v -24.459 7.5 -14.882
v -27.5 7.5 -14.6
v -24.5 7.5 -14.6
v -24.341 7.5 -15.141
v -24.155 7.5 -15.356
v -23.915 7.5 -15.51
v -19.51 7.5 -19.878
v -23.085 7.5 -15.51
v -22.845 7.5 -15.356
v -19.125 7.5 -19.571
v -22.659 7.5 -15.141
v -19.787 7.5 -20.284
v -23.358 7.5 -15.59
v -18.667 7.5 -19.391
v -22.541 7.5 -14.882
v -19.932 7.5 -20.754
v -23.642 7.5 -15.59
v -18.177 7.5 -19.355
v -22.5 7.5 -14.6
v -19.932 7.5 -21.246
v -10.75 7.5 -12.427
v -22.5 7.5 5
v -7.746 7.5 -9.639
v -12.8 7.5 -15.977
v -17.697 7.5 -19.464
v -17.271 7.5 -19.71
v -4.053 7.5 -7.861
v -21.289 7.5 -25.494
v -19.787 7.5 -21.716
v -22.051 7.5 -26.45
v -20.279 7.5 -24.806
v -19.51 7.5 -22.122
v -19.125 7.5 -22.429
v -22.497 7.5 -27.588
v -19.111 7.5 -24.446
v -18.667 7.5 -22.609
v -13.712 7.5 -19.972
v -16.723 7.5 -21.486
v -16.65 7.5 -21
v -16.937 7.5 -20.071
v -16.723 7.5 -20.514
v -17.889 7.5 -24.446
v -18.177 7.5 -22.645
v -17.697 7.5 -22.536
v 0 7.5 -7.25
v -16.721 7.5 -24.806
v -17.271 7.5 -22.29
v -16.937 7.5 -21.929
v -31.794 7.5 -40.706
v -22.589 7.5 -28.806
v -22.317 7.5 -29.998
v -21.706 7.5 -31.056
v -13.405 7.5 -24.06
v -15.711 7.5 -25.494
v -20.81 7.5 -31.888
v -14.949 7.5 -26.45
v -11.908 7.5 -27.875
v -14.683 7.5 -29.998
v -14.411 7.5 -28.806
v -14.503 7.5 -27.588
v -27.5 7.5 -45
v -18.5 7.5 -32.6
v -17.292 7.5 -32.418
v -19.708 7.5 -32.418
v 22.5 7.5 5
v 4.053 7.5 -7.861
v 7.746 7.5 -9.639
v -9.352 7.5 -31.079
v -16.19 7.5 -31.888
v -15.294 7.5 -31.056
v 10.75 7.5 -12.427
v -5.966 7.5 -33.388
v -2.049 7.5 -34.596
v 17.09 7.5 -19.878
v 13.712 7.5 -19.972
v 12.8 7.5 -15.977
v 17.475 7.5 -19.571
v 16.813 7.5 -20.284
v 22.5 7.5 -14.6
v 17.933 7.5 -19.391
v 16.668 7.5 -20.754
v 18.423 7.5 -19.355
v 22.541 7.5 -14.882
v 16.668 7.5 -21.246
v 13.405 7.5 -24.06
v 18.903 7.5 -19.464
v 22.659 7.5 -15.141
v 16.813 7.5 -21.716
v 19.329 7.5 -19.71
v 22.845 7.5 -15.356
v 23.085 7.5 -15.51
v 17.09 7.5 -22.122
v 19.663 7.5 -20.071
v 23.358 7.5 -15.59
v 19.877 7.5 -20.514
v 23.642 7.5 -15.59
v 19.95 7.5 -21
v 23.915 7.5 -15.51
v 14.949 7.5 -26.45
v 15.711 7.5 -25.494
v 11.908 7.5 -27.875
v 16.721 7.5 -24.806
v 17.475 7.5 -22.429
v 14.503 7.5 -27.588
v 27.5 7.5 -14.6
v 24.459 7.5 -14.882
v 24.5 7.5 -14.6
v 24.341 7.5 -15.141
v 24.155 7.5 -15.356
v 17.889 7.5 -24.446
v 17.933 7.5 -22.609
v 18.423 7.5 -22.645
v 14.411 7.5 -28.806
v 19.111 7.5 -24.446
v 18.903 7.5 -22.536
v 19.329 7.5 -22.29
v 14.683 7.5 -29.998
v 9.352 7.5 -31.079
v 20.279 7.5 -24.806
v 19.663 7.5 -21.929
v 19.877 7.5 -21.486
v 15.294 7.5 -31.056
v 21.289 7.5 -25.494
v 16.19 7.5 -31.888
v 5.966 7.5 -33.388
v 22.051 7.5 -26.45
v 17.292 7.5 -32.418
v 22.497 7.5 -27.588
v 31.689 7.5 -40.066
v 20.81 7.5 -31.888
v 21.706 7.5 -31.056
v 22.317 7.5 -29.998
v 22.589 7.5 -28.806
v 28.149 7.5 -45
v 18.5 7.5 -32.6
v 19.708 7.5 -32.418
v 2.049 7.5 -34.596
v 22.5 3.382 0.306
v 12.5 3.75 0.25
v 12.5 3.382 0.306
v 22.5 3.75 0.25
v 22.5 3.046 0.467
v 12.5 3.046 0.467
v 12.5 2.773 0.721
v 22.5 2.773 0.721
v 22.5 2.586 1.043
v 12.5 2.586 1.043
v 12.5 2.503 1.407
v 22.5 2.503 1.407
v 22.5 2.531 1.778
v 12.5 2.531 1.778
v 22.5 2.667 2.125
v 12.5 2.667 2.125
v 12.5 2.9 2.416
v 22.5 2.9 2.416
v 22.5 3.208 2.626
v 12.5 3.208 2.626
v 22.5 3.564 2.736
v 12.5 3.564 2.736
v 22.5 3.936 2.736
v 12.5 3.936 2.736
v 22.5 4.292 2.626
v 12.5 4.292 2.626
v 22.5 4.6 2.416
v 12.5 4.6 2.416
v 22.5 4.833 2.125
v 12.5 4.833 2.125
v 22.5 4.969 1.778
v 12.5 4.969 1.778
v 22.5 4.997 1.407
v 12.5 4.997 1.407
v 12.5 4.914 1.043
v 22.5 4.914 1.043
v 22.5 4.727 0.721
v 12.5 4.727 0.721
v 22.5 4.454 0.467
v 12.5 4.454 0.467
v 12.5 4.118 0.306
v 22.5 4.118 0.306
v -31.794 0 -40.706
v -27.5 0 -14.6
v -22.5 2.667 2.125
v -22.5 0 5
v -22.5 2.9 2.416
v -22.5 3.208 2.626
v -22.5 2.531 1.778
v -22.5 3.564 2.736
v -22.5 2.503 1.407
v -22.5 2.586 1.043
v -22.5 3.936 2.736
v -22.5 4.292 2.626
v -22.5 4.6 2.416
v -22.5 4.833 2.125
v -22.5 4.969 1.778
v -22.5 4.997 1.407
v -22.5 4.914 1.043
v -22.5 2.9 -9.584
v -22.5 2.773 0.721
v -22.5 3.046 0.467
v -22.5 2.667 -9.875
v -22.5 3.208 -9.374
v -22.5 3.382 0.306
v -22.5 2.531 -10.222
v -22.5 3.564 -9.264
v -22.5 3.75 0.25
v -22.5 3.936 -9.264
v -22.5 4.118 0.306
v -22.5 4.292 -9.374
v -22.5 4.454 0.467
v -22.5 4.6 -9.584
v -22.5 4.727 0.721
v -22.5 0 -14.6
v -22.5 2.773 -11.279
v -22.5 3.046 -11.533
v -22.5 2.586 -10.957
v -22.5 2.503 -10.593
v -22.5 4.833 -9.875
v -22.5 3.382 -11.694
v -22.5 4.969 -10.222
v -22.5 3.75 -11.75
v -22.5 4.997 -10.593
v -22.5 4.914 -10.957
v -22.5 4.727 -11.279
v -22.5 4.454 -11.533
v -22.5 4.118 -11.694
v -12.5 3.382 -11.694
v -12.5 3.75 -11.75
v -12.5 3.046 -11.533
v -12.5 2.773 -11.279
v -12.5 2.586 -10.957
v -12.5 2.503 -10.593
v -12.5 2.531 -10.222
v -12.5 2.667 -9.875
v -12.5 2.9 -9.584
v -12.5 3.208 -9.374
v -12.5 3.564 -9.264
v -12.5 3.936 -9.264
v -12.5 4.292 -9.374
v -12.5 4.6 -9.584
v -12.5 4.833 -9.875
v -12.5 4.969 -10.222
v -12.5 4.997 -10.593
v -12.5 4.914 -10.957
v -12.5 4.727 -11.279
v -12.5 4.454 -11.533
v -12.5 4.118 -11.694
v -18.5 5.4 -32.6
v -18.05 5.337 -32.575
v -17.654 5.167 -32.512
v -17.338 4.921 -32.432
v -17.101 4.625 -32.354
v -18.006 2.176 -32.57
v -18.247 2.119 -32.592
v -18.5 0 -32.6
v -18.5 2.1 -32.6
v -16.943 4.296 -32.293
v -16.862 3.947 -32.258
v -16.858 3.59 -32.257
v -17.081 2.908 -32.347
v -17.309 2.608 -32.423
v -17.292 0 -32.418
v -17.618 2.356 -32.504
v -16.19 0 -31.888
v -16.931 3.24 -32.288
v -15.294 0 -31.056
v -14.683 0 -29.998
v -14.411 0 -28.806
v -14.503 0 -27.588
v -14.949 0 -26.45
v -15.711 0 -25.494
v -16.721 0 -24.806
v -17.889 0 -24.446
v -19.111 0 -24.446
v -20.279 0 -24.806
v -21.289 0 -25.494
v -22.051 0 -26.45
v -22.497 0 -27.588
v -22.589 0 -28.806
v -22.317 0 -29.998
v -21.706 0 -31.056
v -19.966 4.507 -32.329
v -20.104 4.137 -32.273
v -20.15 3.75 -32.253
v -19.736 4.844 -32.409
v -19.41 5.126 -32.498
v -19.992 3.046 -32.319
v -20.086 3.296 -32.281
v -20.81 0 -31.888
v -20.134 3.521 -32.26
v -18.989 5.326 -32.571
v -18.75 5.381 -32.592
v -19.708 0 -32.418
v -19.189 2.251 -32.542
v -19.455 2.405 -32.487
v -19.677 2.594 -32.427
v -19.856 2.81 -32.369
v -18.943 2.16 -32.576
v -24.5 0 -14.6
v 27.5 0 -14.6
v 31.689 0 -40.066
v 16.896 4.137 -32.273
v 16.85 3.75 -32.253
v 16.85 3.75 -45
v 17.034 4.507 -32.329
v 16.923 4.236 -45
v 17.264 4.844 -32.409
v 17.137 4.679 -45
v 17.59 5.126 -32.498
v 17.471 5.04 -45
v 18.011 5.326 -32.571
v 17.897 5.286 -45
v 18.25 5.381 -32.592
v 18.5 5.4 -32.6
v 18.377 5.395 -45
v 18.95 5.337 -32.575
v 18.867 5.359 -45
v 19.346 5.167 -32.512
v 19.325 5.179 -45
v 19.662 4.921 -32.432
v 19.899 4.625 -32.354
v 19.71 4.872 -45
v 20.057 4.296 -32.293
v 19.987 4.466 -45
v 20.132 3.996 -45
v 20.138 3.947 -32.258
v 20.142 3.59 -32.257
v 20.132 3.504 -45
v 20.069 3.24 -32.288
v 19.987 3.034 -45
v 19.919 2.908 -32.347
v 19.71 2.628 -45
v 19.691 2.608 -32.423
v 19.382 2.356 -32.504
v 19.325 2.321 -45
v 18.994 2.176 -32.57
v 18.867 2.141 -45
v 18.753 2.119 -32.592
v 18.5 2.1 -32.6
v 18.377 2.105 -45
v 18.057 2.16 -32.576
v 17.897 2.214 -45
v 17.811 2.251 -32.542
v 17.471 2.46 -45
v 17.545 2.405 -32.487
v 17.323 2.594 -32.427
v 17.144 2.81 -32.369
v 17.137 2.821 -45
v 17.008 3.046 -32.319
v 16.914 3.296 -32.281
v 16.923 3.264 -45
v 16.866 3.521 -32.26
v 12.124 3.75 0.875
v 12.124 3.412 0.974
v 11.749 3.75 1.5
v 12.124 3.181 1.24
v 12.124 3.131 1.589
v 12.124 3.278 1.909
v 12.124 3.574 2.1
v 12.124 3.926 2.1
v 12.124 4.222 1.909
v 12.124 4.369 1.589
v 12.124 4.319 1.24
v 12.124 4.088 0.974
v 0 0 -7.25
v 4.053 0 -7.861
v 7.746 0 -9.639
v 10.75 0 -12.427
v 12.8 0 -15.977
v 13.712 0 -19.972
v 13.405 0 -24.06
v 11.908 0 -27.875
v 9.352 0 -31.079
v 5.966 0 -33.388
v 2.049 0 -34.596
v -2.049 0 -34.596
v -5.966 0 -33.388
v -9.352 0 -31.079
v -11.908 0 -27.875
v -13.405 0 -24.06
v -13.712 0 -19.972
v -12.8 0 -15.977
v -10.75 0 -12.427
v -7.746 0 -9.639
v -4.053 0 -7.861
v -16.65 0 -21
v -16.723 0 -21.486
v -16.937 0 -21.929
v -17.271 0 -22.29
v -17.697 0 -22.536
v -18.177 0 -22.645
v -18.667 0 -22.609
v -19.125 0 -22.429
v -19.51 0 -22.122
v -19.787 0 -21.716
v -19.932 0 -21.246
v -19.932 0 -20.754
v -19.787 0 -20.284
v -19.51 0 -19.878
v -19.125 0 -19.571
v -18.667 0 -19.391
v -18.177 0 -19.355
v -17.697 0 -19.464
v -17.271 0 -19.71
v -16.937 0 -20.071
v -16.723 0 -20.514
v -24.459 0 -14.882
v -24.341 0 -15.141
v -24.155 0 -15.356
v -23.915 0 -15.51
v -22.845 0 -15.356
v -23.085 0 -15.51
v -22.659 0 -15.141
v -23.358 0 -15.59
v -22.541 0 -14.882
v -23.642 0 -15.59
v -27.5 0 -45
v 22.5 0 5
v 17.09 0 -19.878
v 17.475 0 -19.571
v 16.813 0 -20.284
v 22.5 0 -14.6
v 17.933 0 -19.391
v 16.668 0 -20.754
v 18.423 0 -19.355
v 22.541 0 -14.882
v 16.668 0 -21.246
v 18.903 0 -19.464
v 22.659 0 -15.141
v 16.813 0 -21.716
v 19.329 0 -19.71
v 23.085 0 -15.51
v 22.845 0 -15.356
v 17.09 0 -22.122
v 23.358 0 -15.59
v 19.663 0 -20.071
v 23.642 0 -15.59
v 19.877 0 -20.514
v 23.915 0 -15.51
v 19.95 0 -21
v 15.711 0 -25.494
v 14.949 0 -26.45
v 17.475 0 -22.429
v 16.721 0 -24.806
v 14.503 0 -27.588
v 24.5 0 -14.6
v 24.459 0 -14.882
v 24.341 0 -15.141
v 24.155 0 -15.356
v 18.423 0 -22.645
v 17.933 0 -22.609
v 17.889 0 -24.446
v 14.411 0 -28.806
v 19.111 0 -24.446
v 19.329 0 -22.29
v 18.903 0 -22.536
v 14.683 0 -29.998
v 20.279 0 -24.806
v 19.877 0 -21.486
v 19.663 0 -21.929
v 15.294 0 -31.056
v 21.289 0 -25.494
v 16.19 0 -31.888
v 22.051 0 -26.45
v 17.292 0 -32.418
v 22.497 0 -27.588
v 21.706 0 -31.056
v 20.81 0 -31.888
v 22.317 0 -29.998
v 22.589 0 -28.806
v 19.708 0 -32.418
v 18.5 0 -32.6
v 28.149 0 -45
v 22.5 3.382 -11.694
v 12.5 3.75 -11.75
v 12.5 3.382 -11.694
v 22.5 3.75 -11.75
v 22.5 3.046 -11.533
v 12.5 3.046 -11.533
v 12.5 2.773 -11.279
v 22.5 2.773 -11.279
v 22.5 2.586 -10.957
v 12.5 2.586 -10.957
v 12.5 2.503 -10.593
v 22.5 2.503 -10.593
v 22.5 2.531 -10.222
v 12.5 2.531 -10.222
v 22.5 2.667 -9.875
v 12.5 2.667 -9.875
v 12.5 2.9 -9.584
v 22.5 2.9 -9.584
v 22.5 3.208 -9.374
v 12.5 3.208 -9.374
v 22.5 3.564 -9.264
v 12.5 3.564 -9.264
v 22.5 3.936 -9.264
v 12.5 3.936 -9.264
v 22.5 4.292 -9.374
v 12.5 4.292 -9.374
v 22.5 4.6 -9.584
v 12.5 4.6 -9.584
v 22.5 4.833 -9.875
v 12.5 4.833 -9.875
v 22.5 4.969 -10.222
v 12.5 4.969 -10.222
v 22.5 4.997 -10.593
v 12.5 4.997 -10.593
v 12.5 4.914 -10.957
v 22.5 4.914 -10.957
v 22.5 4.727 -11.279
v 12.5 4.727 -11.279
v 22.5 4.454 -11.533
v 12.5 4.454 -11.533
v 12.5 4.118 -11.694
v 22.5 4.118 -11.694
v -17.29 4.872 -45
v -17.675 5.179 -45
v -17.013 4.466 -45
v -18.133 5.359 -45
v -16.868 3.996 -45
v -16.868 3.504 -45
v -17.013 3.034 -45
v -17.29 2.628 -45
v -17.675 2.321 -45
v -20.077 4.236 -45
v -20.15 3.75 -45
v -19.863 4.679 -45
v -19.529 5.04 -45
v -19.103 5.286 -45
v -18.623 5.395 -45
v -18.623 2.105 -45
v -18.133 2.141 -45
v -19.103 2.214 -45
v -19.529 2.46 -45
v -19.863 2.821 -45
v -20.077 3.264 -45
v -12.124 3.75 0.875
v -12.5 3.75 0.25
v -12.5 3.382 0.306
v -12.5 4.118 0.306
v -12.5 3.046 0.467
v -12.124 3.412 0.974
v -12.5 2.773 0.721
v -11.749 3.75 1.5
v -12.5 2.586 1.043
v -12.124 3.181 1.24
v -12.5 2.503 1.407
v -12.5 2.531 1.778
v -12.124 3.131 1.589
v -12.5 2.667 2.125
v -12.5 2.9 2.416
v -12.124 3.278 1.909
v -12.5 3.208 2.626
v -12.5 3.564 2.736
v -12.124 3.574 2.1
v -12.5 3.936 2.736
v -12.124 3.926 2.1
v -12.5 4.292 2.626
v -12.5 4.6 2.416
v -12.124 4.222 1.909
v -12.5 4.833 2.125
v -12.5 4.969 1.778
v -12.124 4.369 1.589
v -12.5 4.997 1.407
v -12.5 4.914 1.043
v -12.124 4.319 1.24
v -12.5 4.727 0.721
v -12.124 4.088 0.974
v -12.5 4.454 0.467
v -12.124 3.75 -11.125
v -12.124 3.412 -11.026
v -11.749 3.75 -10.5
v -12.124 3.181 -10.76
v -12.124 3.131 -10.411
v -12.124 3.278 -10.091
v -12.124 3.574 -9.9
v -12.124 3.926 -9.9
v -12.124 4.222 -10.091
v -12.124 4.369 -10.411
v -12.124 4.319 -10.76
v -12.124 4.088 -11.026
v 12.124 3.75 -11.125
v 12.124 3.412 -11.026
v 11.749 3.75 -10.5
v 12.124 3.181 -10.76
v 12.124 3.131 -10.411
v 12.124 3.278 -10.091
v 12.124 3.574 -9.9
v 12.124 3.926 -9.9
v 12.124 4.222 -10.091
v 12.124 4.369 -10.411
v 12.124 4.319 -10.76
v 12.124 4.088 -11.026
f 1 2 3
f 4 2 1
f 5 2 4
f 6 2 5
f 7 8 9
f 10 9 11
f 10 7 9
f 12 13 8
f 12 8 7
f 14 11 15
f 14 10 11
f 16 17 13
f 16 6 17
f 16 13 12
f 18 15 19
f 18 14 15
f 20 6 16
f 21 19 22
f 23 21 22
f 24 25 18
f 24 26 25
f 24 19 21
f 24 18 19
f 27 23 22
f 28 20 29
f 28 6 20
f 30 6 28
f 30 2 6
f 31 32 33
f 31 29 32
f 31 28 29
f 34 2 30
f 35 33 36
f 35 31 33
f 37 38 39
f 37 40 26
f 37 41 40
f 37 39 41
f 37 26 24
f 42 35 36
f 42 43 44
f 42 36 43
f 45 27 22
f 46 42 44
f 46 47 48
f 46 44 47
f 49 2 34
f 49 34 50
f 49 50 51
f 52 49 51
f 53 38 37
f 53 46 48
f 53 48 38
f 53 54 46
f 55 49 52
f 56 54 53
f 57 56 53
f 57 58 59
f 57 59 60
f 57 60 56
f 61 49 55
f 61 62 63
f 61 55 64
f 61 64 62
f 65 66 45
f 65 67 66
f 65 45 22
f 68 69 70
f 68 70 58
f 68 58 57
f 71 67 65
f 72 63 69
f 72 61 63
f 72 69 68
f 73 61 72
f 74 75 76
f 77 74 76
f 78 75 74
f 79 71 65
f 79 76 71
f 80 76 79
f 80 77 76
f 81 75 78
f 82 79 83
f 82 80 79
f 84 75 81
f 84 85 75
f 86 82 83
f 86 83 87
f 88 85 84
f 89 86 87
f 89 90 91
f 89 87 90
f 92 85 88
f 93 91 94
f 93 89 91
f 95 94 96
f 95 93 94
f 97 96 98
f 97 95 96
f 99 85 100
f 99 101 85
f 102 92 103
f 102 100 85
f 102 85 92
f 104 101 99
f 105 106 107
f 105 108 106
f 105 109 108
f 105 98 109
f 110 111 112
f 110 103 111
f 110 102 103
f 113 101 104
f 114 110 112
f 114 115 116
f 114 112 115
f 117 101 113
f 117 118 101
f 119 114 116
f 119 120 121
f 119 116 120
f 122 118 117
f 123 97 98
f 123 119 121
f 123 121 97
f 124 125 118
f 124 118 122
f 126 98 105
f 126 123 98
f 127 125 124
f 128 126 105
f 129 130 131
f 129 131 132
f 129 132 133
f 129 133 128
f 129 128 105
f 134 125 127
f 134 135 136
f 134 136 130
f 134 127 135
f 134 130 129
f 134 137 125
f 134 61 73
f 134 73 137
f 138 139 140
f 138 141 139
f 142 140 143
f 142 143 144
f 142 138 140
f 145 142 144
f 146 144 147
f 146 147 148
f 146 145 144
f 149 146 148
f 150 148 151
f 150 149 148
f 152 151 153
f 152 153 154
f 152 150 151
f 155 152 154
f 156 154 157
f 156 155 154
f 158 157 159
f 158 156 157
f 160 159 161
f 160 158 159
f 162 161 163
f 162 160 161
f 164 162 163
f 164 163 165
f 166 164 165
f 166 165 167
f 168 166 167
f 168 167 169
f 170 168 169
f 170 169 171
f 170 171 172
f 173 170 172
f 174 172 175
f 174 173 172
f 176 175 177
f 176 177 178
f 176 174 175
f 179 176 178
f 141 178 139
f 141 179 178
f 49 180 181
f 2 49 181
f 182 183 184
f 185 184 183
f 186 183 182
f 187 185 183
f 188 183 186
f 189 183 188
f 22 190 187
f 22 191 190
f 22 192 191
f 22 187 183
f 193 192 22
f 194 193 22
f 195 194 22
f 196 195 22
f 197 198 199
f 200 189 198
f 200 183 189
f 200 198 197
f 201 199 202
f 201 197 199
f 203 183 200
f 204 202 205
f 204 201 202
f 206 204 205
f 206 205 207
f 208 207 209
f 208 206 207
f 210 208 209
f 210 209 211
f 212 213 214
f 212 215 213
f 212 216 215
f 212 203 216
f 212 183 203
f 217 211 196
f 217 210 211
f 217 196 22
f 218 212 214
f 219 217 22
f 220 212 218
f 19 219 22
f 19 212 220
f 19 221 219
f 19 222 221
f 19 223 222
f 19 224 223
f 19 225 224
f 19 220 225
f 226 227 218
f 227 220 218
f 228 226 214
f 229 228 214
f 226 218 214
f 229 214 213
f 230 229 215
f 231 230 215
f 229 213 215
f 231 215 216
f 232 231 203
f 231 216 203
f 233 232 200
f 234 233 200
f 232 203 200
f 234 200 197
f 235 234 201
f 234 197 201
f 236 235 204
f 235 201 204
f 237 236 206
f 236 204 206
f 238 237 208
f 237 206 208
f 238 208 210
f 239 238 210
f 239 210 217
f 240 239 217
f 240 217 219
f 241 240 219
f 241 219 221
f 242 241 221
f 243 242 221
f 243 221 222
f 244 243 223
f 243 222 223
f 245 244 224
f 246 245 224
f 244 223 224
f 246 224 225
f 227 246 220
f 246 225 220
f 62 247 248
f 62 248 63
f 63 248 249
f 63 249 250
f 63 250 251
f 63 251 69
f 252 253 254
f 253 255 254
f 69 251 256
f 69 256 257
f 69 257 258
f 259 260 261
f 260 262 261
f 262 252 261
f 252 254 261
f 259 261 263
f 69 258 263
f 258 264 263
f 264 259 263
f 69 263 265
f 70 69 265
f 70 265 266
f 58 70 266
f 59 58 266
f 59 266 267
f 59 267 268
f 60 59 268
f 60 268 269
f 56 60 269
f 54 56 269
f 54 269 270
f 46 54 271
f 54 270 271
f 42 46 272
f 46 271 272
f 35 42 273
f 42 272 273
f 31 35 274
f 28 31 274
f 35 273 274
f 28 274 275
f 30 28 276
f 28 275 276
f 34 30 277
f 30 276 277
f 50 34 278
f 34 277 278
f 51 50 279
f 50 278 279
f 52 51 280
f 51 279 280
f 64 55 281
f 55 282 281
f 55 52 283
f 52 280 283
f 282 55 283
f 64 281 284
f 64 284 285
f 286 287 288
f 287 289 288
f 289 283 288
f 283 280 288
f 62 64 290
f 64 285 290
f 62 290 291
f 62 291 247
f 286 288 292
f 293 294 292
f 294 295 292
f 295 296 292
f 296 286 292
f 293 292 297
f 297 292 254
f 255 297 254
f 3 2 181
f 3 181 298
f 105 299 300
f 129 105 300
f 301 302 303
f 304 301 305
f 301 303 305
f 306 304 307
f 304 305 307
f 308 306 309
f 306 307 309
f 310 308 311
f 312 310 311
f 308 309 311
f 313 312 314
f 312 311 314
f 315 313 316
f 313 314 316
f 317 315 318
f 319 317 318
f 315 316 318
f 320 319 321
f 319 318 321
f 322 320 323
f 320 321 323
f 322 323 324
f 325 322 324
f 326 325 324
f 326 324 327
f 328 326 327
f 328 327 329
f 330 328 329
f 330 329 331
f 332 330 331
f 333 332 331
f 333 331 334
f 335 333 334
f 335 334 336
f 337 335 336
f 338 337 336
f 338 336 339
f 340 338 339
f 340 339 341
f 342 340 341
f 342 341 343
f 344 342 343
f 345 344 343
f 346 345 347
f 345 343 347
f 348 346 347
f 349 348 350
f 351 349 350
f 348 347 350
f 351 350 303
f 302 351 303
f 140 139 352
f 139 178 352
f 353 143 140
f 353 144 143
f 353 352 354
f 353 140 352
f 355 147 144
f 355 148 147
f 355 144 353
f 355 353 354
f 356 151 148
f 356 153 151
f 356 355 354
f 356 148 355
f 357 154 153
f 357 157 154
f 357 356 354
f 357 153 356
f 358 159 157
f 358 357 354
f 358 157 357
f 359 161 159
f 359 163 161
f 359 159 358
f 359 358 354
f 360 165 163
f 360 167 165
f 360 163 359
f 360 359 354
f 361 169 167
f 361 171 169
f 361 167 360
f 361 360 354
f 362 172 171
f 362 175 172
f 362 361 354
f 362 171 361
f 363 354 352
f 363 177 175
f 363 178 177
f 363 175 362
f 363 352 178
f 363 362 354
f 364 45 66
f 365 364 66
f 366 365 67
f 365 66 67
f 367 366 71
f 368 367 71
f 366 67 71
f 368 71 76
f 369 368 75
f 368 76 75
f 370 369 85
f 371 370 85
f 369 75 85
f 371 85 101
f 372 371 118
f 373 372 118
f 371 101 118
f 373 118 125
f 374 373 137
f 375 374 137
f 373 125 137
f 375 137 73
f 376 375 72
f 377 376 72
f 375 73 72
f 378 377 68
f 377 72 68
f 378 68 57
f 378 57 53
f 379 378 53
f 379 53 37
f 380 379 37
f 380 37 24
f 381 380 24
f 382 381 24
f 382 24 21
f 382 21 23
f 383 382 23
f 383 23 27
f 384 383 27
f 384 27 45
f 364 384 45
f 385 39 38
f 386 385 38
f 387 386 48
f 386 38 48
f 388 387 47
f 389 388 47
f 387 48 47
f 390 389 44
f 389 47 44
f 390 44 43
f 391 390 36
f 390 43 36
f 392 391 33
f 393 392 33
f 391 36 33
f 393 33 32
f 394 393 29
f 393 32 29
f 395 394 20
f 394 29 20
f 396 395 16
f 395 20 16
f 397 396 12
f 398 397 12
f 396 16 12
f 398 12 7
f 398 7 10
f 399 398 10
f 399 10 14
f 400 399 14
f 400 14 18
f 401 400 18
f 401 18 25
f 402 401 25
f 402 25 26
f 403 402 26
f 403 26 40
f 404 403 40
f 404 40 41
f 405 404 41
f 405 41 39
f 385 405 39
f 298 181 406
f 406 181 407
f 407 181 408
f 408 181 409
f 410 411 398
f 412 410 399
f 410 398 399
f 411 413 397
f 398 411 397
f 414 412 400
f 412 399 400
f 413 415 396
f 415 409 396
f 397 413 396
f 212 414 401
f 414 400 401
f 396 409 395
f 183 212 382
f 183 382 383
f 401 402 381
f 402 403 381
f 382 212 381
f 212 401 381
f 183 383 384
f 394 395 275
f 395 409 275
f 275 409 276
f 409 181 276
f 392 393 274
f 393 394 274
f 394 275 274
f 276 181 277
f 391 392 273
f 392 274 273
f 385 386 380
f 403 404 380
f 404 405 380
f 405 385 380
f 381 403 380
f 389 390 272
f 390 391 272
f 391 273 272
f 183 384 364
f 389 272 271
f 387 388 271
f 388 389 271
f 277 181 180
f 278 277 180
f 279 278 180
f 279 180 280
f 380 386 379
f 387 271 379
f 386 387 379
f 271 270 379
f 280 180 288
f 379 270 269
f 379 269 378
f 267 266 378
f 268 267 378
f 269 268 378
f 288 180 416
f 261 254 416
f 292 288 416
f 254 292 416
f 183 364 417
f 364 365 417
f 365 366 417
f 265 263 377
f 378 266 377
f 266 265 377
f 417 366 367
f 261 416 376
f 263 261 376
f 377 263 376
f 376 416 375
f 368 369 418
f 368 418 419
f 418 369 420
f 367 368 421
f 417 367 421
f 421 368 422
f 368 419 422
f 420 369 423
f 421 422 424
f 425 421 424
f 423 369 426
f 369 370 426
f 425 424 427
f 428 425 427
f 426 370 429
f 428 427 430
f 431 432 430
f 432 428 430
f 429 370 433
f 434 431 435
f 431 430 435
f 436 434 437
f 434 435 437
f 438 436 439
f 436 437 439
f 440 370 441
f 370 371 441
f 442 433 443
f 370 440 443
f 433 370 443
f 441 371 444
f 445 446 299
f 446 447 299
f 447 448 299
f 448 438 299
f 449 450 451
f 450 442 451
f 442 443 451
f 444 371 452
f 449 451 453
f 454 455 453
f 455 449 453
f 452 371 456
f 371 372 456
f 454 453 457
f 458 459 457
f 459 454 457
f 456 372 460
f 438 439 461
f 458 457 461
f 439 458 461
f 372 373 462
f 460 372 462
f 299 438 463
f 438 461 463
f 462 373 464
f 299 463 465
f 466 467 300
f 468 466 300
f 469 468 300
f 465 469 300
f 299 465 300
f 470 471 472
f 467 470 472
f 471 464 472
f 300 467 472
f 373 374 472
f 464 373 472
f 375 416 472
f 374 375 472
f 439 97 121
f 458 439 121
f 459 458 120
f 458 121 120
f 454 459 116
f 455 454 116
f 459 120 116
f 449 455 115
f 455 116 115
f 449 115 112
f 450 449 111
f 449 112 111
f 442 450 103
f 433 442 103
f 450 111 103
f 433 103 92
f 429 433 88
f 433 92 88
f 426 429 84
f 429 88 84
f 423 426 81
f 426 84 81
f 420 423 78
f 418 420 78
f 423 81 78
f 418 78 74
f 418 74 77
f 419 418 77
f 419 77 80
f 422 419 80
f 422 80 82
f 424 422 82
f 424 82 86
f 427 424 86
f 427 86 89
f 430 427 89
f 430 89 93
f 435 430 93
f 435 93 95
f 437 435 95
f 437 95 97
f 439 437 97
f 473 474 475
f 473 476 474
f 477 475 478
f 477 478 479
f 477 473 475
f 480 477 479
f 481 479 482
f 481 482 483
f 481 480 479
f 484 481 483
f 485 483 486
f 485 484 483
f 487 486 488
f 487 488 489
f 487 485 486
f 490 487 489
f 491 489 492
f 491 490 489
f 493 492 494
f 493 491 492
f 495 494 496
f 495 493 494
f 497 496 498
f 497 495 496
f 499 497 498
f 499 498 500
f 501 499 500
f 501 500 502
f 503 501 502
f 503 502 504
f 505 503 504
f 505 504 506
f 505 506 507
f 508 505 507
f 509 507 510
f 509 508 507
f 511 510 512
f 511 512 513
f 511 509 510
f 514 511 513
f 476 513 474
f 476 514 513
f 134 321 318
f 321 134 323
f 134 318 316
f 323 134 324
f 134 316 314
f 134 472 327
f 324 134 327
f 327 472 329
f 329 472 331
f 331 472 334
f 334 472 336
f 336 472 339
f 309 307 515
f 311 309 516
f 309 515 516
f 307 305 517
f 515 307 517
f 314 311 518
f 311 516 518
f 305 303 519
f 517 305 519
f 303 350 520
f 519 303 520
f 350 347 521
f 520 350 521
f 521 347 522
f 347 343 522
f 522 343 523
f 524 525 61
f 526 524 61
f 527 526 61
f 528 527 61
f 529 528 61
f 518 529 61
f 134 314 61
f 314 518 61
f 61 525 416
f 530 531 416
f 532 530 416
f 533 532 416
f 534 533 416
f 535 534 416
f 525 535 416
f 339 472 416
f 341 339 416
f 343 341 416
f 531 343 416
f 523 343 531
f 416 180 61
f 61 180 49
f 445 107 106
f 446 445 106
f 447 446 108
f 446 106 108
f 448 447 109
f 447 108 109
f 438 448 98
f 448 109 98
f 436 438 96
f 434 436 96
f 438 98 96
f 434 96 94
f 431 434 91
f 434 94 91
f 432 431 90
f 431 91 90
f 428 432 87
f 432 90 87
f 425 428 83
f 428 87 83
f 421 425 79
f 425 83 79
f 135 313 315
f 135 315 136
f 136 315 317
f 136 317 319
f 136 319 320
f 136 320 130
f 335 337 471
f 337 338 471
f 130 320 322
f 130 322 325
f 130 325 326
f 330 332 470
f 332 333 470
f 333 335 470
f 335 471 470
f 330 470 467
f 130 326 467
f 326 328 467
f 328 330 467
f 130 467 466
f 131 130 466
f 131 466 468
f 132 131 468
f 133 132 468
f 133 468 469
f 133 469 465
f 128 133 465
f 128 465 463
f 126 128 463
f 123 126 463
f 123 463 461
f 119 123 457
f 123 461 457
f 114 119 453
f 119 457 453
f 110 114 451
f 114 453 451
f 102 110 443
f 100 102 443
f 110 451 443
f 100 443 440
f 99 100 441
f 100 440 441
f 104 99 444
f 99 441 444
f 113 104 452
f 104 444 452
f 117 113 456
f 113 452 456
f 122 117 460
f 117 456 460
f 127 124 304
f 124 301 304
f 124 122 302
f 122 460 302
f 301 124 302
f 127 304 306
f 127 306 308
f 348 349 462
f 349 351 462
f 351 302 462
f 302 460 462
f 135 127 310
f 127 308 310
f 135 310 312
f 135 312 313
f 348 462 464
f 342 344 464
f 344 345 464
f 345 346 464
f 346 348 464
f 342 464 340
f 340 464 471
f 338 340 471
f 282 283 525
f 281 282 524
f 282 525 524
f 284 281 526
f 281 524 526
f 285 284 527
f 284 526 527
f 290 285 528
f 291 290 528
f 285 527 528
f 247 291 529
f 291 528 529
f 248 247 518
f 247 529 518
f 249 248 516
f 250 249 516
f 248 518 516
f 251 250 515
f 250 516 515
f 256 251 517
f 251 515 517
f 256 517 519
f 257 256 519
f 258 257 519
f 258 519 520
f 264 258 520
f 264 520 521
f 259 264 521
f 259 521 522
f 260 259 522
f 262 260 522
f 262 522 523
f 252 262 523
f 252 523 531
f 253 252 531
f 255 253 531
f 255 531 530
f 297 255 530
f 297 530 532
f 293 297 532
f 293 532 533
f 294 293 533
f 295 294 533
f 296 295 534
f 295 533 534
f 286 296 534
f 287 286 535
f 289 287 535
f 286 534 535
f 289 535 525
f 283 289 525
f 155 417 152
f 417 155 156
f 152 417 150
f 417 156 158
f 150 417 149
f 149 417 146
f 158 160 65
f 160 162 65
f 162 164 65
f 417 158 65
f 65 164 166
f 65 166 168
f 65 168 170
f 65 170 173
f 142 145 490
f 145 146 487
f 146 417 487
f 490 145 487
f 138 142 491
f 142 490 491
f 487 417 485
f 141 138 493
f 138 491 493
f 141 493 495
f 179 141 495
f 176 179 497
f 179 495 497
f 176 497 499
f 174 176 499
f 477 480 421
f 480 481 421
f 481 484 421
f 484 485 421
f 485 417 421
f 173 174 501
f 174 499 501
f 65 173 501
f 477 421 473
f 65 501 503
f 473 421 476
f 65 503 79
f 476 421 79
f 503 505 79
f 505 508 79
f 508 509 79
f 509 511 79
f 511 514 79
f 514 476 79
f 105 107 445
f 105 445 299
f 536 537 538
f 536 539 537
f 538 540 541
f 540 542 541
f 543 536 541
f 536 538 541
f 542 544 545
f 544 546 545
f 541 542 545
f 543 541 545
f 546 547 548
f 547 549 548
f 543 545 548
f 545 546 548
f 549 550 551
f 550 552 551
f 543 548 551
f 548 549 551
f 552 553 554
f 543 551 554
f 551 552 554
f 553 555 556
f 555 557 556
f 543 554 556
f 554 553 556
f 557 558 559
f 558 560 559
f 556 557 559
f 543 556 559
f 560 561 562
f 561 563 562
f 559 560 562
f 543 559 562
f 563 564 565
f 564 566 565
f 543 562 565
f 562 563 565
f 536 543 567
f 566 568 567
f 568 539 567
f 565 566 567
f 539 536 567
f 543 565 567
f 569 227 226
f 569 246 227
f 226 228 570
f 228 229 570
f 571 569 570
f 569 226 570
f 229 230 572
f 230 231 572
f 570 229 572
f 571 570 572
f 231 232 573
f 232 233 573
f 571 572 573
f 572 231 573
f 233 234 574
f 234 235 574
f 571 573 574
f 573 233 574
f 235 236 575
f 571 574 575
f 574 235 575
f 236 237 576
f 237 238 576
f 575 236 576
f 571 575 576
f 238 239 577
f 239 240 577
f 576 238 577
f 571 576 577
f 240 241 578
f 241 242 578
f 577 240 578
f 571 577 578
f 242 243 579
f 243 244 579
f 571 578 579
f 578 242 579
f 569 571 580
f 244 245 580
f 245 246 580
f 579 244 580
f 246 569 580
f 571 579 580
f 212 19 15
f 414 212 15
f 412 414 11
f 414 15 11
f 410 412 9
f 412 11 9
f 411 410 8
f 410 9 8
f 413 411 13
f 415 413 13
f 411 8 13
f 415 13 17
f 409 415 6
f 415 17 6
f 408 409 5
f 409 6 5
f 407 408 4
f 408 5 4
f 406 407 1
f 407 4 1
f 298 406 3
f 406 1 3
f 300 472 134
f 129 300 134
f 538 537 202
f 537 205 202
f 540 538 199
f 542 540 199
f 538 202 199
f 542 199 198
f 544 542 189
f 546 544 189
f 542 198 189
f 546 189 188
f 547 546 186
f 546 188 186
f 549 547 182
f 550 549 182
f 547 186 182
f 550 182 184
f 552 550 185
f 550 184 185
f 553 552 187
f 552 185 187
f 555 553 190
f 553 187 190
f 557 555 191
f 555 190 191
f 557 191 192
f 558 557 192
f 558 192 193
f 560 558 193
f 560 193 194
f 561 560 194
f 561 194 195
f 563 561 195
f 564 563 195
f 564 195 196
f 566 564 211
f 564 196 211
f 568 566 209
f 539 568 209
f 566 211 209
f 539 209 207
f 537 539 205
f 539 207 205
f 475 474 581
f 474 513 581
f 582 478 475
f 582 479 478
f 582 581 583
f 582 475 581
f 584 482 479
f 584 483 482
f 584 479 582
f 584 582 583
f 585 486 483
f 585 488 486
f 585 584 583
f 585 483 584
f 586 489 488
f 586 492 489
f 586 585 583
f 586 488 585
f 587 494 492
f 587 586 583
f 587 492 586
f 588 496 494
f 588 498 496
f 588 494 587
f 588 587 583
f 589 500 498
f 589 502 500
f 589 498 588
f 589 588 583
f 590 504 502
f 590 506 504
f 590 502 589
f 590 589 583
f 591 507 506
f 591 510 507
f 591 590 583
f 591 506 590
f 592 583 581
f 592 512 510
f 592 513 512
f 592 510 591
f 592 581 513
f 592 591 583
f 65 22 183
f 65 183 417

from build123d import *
from OCP.BRepFilletAPI import BRepFilletAPI_MakeChamfer

# Parameters (mm, degrees)
BOSS_EXTRUDE1_DEPTH            = 7.5
CUT_EXTRUDE1_REACH             = 58.013
SKETCH2_R                      = 1
CUT_EXTRUDE1_DIRECTION_2_DEPTH = 57.013391256
CHAMFER1_SIZE                  = 5
CHAMFER1_SIZE2                 = 4.351474633
CUT_EXTRUDE2_REACH             = 57.607
SKETCH3_R                      = 13.75
SKETCH11_W                     = 45
SKETCH11_H                     = 7.5
BOSS_EXTRUDE2_DEPTH            = 5
M4_TAPPED_HOLE1_D              = 3.3
CUT_EXTRUDE3_REACH             = 57.607
SKETCH6_R                      = 4.1
M4_TAPPED_HOLE2_REACH          = 61.725
M4_TAPPED_HOLE2_BORE_R         = 1.65
M3_TAPPED_HOLE1_AT_2_COUNT     = 2
M3_TAPPED_HOLE1_AT_2_PITCH     = 12


with BuildPart() as part:
    # Sketch1 → Boss-Extrude1 (new body)
    with BuildSketch(Plane(origin=(0, 0, 0), x_dir=(1, 0, 0), z_dir=(0, 1, 0))):
        Polygon((-22.5, 0), (22.5, 0), (22.5, 14.6), (27.5, 14.6), (32.5, 45), (-32.5, 45), (-27.5, 14.6), (-22.5, 14.6), align=None)
    extrude(amount=BOSS_EXTRUDE1_DEPTH)

    # Sketch2 → Cut-Extrude1 (cut, up to next)
    with BuildSketch(Plane(origin=(0, 7.5, 0), x_dir=(1, 0, 0), z_dir=(0, 1, 0)), mode=Mode.PRIVATE) as cut_extrude1_sk1:
        with Locations((-23.5, 14.6)):
            Circle(SKETCH2_R)
    cut_extrude1_tool1 = extrude(cut_extrude1_sk1.sketch, amount=-CUT_EXTRUDE1_REACH, mode=Mode.PRIVATE) & part.part
    # Sketch2 → Cut-Extrude1 (cut, up to next)
    with BuildSketch(Plane(origin=(0, 7.5, 0), x_dir=(1, 0, 0), z_dir=(0, 1, 0)), mode=Mode.PRIVATE) as cut_extrude1_sk2:
        with Locations((23.5, 14.6)):
            Circle(SKETCH2_R)
    cut_extrude1_tool2 = extrude(cut_extrude1_sk2.sketch, amount=-CUT_EXTRUDE1_REACH, mode=Mode.PRIVATE) & part.part
    add(cut_extrude1_tool1.solids().sort_by_distance((-23.5, 7.5, -14.6))[0], mode=Mode.SUBTRACT)
    add(cut_extrude1_tool2.solids().sort_by_distance((23.5, 7.5, -14.6))[0], mode=Mode.SUBTRACT)

    # Sketch2 → Cut-Extrude1 direction 2 (cut)
    with BuildSketch(Plane(origin=(0, 7.5, 0), x_dir=(1, 0, 0), z_dir=(0, 1, 0))):
        with Locations((-23.5, 14.6)):
            Circle(SKETCH2_R)
        with Locations((23.5, 14.6)):
            Circle(SKETCH2_R)
    extrude(amount=CUT_EXTRUDE1_DIRECTION_2_DEPTH, mode=Mode.SUBTRACT)

    # Chamfer1: one chamfer whose edges measure the first distance from different faces: ONE call of the kernel's chamfer builder (chamfer() names one face for all edges)
    chamfer1_edges_1 = [part.edges().sort_by_distance(p)[0] for p in [
        (-32.5, 3.75, -45),
    ]]
    chamfer1_side_1 = [part.faces().sort_by_distance(p)[0] for p in [
        (0, 3.75, -45),
    ]]
    chamfer1_edges_2 = [part.edges().sort_by_distance(p)[0] for p in [
        (32.5, 3.75, -45),
    ]]
    chamfer1_side_2 = [part.faces().sort_by_distance(p)[0] for p in [
        (30, 3.75, -29.8),
    ]]
    chamfer1 = BRepFilletAPI_MakeChamfer(part.part.solid().wrapped)
    for e in chamfer1_edges_1:
        chamfer1.Add(CHAMFER1_SIZE, CHAMFER1_SIZE2, e.wrapped, chamfer1_side_1[0].wrapped)  # the first distance lies on this face
    for e in chamfer1_edges_2:
        chamfer1.Add(CHAMFER1_SIZE, CHAMFER1_SIZE2, e.wrapped, chamfer1_side_2[0].wrapped)  # the first distance lies on this face
    add(Compound.cast(chamfer1.Shape()), mode=Mode.REPLACE)

    # Sketch3 → Cut-Extrude2 (cut, up to next)
    with BuildSketch(Plane(origin=(0, 7.5, 0), x_dir=(1, 0, 0), z_dir=(0, 1, 0)), mode=Mode.PRIVATE) as cut_extrude2_sk1:
        with Locations(Location((0, 21, 0), (0, 0, 270))):
            Circle(SKETCH3_R)
    cut_extrude2_tool1 = extrude(cut_extrude2_sk1.sketch, amount=-CUT_EXTRUDE2_REACH, mode=Mode.PRIVATE) & part.part
    add(cut_extrude2_tool1.solids().sort_by_distance((0, 7.5, -21))[0], mode=Mode.SUBTRACT)

    # Sketch11 → Boss-Extrude2 (add)
    with BuildSketch(Plane.XY):
        with Locations((0, 3.75)):
            Rectangle(SKETCH11_W, SKETCH11_H)
    extrude(amount=BOSS_EXTRUDE2_DEPTH)

    # M4 Tapped Hole1 (through all)
    with Locations(Plane(origin=(0, 0, 0), x_dir=(-1, 0, 0), z_dir=(0, -1, 0))):
        with Locations((-18.3, 21), (18.3, 21)):
            Hole(M4_TAPPED_HOLE1_D / 2)

    # Sketch6 → Cut-Extrude3 (cut, up to next)
    with BuildSketch(Plane.XZ, mode=Mode.PRIVATE) as cut_extrude3_sk1:
        with Locations(Location((18.5, -28.5, 0), (0, 0, 270))):
            Circle(SKETCH6_R)
    cut_extrude3_tool1 = extrude(cut_extrude3_sk1.sketch, amount=-CUT_EXTRUDE3_REACH, mode=Mode.PRIVATE) & part.part
    # Sketch6 → Cut-Extrude3 (cut, up to next)
    with BuildSketch(Plane.XZ, mode=Mode.PRIVATE) as cut_extrude3_sk2:
        with Locations(Location((-18.5, -28.5, 0), (0, 0, 270))):
            Circle(SKETCH6_R)
    cut_extrude3_tool2 = extrude(cut_extrude3_sk2.sketch, amount=-CUT_EXTRUDE3_REACH, mode=Mode.PRIVATE) & part.part
    add(cut_extrude3_tool1.solids().sort_by_distance((18.5, 0, -28.5))[0], mode=Mode.SUBTRACT)
    add(cut_extrude3_tool2.solids().sort_by_distance((-18.5, 0, -28.5))[0], mode=Mode.SUBTRACT)

    # M4 Tapped Hole2 bore → M4 Tapped Hole2 (cut, up to next)
    with BuildSketch(Plane(origin=(0, 0, -45), x_dir=(-1, 0, 0), z_dir=(0, 0, -1)), mode=Mode.PRIVATE) as m4_tapped_hole2_sk1:
        with Locations((-18.5, 3.75)):
            Circle(M4_TAPPED_HOLE2_BORE_R)
    m4_tapped_hole2_tool1 = extrude(m4_tapped_hole2_sk1.sketch, amount=-M4_TAPPED_HOLE2_REACH, mode=Mode.PRIVATE) & part.part
    # M4 Tapped Hole2 bore → M4 Tapped Hole2 (cut, up to next)
    with BuildSketch(Plane(origin=(0, 0, -45), x_dir=(-1, 0, 0), z_dir=(0, 0, -1)), mode=Mode.PRIVATE) as m4_tapped_hole2_sk2:
        with Locations((18.5, 3.75)):
            Circle(M4_TAPPED_HOLE2_BORE_R)
    m4_tapped_hole2_tool2 = extrude(m4_tapped_hole2_sk2.sketch, amount=-M4_TAPPED_HOLE2_REACH, mode=Mode.PRIVATE) & part.part
    add(m4_tapped_hole2_tool1.solids().sort_by_distance((18.5, 3.75, -45))[0], mode=Mode.SUBTRACT)
    add(m4_tapped_hole2_tool2.solids().sort_by_distance((-18.5, 3.75, -45))[0], mode=Mode.SUBTRACT)

    # Sketch10 → M3 Tapped Hole1 (revolve, cut)
    with BuildSketch(Plane(origin=(22.5, 3.75, -10.5), x_dir=(0, 0, -1), z_dir=(0, 1, 0))):
        Polygon((0, 0), (0, 10.751075774), (1.25, 10), (1.25, 0), align=None)
    m3_tapped_hole1 = revolve(axis=Axis((28.85, 3.75, -10.5), (-1, 0, 0)), mode=Mode.SUBTRACT)

    # M3 Tapped Hole1 at 2: M3 Tapped Hole1 ×2
    with Locations(*[(0, 0, i * M3_TAPPED_HOLE1_AT_2_PITCH) for i in range(1, M3_TAPPED_HOLE1_AT_2_COUNT)]):
        add(m3_tapped_hole1, mode=Mode.SUBTRACT)

    # Mirror1: M3 Tapped Hole1 across plane
    add(m3_tapped_hole1.mirror(Plane(origin=(0, 0, 0), x_dir=(0, 0, 1), z_dir=(1, 0, 0))), mode=Mode.SUBTRACT)

    # Mirror1 copy 1 sketch → Mirror1 copy 1 (revolve, cut)
    with BuildSketch(Plane(origin=(-22.5, 3.75, 1.5), x_dir=(0, 0, -1), z_dir=(0, 1, 0))):
        Polygon((0, 0), (0, -10.751075774), (1.25, -10), (1.25, 0), align=None)
    revolve(axis=Axis((-28.85, 3.75, 1.5), (-1, 0, 0)), mode=Mode.SUBTRACT)


solid = part.part
